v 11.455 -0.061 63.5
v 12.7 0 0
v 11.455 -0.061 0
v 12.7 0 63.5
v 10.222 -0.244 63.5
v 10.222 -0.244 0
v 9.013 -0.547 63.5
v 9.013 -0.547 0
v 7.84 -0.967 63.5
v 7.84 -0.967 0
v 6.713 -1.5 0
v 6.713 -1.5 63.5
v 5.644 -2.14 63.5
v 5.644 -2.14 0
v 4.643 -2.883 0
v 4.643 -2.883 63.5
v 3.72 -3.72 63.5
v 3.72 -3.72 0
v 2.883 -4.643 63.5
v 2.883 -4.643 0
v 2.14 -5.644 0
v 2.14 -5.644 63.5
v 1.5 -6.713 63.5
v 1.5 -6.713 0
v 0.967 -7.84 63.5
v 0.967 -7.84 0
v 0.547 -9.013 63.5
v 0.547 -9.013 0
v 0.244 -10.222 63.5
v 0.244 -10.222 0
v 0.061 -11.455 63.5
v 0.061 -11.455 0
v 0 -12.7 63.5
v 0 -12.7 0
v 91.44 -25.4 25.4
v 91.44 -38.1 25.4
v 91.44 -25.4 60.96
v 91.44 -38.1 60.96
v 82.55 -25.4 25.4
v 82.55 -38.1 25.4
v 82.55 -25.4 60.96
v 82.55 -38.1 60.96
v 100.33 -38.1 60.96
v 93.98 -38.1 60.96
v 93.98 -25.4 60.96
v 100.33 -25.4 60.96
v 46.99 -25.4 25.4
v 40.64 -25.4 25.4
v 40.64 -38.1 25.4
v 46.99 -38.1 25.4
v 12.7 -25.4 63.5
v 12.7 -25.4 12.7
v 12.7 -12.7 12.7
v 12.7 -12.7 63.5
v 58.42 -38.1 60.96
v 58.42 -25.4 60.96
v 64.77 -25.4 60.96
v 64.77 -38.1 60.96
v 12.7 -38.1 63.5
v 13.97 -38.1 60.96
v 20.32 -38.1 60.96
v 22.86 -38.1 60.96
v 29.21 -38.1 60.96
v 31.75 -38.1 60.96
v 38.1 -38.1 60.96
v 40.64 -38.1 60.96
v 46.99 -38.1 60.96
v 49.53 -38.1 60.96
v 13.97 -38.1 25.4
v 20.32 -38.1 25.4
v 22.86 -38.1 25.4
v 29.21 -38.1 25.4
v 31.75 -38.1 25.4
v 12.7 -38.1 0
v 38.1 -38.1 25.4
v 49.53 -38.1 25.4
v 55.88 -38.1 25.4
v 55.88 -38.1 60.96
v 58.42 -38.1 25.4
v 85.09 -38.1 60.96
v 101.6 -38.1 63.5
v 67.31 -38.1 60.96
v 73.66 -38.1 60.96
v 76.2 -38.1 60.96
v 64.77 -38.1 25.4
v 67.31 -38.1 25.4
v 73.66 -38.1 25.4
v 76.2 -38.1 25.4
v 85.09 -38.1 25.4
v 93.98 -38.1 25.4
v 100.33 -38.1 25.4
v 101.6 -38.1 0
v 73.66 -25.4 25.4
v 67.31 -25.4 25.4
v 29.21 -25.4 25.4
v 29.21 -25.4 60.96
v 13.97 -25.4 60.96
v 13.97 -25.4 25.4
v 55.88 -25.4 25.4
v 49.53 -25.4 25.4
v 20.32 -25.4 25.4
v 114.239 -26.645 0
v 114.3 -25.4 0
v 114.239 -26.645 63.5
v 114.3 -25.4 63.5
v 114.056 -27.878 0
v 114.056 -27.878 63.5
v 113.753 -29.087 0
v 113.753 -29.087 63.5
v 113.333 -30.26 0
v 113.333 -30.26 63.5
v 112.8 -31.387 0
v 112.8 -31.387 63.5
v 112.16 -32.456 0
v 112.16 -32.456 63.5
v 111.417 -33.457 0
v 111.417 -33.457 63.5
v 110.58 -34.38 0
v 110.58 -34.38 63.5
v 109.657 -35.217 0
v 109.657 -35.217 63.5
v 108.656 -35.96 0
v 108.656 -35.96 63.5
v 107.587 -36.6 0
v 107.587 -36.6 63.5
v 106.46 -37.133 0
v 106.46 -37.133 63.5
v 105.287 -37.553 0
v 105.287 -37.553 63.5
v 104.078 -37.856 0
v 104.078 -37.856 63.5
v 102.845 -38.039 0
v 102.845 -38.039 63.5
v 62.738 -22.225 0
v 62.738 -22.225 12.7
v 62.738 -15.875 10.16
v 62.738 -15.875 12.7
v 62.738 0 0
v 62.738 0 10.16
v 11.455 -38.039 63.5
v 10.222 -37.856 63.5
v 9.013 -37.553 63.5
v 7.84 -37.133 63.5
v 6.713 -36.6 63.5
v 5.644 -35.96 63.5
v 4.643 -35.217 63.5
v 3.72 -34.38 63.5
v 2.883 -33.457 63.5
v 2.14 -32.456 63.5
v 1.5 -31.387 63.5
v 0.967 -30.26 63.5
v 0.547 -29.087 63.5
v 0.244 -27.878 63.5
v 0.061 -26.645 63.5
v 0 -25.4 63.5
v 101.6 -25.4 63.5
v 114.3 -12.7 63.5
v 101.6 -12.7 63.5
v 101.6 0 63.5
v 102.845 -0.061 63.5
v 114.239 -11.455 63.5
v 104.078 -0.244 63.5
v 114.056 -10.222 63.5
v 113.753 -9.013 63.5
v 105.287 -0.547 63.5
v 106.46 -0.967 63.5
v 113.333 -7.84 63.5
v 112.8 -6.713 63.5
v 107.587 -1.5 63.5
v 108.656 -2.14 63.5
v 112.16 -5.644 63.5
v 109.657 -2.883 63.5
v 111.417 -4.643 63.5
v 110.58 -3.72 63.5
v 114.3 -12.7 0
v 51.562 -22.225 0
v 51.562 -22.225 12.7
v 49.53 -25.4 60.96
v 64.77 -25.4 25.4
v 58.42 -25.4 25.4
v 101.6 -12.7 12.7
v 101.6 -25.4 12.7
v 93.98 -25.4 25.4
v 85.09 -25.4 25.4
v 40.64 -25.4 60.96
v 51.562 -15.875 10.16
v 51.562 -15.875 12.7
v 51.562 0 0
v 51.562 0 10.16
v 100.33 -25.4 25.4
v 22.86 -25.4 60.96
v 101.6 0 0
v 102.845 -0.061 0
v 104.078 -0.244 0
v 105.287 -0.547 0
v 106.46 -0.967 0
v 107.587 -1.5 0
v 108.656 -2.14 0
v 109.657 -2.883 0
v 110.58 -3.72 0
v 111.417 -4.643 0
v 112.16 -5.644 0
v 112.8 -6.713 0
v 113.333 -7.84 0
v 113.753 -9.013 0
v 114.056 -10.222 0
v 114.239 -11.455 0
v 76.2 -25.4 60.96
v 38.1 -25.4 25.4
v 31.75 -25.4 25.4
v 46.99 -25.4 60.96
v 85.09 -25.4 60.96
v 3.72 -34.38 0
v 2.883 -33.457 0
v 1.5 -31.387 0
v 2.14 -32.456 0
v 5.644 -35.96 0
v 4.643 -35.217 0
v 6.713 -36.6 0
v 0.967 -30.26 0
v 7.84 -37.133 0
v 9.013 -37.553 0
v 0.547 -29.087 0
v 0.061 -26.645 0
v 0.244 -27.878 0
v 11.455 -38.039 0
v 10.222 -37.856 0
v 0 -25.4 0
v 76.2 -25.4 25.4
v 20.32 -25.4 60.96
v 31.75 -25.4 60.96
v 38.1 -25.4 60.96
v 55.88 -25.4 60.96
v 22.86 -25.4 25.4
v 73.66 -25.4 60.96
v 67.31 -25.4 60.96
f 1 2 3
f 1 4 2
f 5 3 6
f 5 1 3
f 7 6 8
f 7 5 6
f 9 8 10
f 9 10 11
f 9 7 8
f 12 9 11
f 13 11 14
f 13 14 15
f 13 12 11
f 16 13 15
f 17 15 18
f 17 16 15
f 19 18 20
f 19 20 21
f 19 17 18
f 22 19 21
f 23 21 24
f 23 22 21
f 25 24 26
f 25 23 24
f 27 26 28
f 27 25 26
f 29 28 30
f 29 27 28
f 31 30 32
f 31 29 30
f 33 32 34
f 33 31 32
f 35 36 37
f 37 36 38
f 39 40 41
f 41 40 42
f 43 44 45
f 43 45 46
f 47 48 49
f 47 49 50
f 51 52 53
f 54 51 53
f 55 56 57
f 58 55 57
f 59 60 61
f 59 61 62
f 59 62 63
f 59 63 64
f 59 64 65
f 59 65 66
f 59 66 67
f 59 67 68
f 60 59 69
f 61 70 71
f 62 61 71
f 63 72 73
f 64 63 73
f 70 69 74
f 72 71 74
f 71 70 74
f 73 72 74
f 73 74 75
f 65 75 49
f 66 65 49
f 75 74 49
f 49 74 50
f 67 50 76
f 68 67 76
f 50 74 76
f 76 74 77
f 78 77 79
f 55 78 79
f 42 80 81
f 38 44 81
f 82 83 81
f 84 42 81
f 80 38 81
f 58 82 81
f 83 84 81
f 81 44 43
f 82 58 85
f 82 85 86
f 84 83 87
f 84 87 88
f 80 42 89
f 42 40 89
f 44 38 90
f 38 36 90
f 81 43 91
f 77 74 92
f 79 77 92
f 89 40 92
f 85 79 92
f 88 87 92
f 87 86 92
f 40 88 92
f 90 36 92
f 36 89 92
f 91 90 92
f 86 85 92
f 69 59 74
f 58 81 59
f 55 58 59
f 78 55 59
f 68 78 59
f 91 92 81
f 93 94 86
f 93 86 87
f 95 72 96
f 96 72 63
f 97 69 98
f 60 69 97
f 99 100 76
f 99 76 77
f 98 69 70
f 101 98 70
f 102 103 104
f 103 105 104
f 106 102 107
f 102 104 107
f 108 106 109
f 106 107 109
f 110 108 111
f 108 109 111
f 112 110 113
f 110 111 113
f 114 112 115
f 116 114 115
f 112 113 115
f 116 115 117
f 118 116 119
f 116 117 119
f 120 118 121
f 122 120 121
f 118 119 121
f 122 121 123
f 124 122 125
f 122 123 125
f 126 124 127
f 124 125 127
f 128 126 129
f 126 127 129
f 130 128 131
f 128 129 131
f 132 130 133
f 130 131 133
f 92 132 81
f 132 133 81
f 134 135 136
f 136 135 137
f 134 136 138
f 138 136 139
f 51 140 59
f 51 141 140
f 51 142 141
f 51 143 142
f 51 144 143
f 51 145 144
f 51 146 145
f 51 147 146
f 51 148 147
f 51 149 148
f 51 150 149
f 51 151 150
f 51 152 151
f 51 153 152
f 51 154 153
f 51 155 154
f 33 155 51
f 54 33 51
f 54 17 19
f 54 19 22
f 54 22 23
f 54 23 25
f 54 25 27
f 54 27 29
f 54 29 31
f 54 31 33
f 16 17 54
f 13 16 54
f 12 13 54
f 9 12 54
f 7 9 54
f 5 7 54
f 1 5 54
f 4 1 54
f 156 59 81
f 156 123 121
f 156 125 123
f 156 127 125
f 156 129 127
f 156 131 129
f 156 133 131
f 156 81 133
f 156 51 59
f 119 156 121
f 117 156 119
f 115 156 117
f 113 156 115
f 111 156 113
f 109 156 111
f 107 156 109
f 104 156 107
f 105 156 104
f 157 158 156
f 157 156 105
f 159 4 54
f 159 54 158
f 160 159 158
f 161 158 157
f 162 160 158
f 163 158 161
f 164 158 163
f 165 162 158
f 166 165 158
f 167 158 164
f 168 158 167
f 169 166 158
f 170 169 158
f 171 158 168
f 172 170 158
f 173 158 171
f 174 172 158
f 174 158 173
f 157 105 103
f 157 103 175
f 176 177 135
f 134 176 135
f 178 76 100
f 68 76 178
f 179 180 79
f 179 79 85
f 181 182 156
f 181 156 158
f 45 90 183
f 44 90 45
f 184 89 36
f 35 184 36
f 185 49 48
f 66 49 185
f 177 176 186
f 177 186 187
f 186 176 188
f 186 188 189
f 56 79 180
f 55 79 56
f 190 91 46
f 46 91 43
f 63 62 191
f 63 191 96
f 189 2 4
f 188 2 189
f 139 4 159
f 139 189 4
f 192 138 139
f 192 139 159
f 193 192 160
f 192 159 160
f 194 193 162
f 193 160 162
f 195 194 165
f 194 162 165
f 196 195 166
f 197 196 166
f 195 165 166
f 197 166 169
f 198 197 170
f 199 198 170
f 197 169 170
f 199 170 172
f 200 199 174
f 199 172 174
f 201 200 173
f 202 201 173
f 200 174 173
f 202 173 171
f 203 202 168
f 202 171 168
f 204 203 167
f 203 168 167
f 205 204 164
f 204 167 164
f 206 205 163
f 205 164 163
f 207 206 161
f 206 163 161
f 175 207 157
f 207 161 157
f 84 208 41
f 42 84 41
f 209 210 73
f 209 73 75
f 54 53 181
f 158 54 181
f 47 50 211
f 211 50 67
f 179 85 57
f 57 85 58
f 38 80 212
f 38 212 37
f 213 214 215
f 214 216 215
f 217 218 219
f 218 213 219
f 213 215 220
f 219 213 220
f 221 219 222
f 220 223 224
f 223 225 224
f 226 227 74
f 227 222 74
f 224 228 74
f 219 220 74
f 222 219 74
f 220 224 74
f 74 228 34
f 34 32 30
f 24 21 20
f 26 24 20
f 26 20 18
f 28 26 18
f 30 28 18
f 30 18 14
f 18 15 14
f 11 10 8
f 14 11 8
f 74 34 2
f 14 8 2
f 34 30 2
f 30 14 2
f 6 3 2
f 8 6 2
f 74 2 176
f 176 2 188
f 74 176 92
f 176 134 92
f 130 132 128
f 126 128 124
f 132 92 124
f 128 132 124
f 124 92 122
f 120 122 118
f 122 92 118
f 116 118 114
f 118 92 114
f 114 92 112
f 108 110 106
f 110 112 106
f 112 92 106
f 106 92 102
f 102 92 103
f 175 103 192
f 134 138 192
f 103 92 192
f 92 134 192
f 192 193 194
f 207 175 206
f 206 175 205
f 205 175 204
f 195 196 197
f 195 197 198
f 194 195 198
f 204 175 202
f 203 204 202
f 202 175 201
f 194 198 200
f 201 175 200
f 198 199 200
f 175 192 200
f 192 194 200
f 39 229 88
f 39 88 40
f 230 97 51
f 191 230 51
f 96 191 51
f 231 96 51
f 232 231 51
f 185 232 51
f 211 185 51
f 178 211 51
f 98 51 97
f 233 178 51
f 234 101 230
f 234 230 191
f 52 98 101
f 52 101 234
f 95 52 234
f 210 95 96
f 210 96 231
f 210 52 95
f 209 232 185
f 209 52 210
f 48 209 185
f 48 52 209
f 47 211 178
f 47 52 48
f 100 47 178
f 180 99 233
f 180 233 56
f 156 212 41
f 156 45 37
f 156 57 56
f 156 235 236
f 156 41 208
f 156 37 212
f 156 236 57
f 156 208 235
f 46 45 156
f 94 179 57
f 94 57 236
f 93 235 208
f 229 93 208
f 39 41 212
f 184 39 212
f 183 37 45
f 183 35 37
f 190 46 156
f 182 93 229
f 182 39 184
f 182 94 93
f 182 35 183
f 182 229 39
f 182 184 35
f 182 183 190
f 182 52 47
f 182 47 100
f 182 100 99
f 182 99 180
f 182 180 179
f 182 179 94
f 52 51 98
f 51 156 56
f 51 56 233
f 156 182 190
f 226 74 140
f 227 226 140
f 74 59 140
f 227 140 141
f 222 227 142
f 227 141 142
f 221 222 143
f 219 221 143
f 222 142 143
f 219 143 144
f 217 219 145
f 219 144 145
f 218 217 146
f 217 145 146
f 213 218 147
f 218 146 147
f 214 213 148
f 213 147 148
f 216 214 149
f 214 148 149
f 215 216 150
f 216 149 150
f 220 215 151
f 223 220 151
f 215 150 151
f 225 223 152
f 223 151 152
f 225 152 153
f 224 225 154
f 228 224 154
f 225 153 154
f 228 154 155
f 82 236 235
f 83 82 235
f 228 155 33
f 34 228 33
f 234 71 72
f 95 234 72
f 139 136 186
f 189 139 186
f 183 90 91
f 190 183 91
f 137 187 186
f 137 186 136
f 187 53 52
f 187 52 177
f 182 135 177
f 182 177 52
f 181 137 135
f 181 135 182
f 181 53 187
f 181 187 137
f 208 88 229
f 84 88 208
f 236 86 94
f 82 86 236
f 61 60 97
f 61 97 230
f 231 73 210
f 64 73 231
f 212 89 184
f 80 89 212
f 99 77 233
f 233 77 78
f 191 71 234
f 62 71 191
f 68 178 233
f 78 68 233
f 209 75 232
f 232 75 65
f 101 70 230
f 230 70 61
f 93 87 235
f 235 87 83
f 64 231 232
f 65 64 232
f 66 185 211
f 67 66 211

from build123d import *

# Parameters (mm, degrees)
F0_W     = 114.3
F0_H     = 38.1
F0_W_2   = 88.9
F0_H_2   = 12.7
F1_DEPTH = 63.5
F2_DEPTH = 12.7
F3_W     = 6.35
F3_H     = 35.56
F4_DEPTH = 15.24
F5_W     = 11.176
F5_H     = 6.35
F6_DEPTH = 12.701
F7_W     = 11.176
F7_H     = 10.16
F8_DEPTH = 18.288
F9_R     = 12.7


with BuildPart() as f1:
    # F0 (on Top) → F1 (new body)
    with BuildSketch(Plane.XY):
        with Locations((57.15, -19.05)):
            Rectangle(F0_W, F0_H)
        with Locations((57.15, -19.05)):
            Rectangle(F0_W_2, F0_H_2, mode=Mode.SUBTRACT)
    extrude(amount=F1_DEPTH)

    # F0 (on Top) → F2 (join)
    with BuildSketch(Plane.XY):
        with Locations((57.15, -19.05)):
            Rectangle(F0_W_2, F0_H_2)
    extrude(amount=F2_DEPTH)

    # F3 (on face) → F4 (cut)
    with BuildSketch(Plane.XZ.offset(38.1)):
        with Locations((17.145, 43.18)):
            Rectangle(F3_W, F3_H)
        with Locations((26.035, 43.18)):
            Rectangle(F3_W, F3_H)
        with Locations((34.925, 43.18)):
            Rectangle(F3_W, F3_H)
        with Locations((43.815, 43.18)):
            Rectangle(F3_W, F3_H)
        with Locations((52.705, 43.18)):
            Rectangle(F3_W, F3_H)
        with Locations((61.595, 43.18)):
            Rectangle(F3_W, F3_H)
        with Locations((70.485, 43.18)):
            Rectangle(F3_W, F3_H)
        with Locations((79.375, 43.18)):
            Rectangle(F3_W, F3_H)
        with Locations((88.265, 43.18)):
            Rectangle(F3_W, F3_H)
        with Locations((97.155, 43.18)):
            Rectangle(F3_W, F3_H)
    extrude(amount=-F4_DEPTH, mode=Mode.SUBTRACT)

    # F5 (on face) → F6 (cut, through all)
    with BuildSketch(Plane.XY.offset(12.7)):
        with Locations((57.15, -19.05)):
            Rectangle(F5_W, F5_H)
    extrude(amount=-F6_DEPTH, mode=Mode.SUBTRACT)

    # F7 (on face) → F8 (cut)
    with BuildSketch(Plane(origin=(0, 0, 0), x_dir=(-1, 0, 0), z_dir=(0, 1, 0))):
        with Locations((-57.15, 5.08)):
            Rectangle(F7_W, F7_H)
    extrude(amount=-F8_DEPTH, mode=Mode.SUBTRACT)

    # F9
    f9_edges = [f1.edges().sort_by_distance(p)[0] for p in [
        (0, -38.1, 31.75),
        (0, 0, 31.75),
        (114.3, -38.1, 31.75),
        (114.3, 0, 31.75),
    ]]
    fillet(f9_edges, radius=F9_R)


solid = f1.part
